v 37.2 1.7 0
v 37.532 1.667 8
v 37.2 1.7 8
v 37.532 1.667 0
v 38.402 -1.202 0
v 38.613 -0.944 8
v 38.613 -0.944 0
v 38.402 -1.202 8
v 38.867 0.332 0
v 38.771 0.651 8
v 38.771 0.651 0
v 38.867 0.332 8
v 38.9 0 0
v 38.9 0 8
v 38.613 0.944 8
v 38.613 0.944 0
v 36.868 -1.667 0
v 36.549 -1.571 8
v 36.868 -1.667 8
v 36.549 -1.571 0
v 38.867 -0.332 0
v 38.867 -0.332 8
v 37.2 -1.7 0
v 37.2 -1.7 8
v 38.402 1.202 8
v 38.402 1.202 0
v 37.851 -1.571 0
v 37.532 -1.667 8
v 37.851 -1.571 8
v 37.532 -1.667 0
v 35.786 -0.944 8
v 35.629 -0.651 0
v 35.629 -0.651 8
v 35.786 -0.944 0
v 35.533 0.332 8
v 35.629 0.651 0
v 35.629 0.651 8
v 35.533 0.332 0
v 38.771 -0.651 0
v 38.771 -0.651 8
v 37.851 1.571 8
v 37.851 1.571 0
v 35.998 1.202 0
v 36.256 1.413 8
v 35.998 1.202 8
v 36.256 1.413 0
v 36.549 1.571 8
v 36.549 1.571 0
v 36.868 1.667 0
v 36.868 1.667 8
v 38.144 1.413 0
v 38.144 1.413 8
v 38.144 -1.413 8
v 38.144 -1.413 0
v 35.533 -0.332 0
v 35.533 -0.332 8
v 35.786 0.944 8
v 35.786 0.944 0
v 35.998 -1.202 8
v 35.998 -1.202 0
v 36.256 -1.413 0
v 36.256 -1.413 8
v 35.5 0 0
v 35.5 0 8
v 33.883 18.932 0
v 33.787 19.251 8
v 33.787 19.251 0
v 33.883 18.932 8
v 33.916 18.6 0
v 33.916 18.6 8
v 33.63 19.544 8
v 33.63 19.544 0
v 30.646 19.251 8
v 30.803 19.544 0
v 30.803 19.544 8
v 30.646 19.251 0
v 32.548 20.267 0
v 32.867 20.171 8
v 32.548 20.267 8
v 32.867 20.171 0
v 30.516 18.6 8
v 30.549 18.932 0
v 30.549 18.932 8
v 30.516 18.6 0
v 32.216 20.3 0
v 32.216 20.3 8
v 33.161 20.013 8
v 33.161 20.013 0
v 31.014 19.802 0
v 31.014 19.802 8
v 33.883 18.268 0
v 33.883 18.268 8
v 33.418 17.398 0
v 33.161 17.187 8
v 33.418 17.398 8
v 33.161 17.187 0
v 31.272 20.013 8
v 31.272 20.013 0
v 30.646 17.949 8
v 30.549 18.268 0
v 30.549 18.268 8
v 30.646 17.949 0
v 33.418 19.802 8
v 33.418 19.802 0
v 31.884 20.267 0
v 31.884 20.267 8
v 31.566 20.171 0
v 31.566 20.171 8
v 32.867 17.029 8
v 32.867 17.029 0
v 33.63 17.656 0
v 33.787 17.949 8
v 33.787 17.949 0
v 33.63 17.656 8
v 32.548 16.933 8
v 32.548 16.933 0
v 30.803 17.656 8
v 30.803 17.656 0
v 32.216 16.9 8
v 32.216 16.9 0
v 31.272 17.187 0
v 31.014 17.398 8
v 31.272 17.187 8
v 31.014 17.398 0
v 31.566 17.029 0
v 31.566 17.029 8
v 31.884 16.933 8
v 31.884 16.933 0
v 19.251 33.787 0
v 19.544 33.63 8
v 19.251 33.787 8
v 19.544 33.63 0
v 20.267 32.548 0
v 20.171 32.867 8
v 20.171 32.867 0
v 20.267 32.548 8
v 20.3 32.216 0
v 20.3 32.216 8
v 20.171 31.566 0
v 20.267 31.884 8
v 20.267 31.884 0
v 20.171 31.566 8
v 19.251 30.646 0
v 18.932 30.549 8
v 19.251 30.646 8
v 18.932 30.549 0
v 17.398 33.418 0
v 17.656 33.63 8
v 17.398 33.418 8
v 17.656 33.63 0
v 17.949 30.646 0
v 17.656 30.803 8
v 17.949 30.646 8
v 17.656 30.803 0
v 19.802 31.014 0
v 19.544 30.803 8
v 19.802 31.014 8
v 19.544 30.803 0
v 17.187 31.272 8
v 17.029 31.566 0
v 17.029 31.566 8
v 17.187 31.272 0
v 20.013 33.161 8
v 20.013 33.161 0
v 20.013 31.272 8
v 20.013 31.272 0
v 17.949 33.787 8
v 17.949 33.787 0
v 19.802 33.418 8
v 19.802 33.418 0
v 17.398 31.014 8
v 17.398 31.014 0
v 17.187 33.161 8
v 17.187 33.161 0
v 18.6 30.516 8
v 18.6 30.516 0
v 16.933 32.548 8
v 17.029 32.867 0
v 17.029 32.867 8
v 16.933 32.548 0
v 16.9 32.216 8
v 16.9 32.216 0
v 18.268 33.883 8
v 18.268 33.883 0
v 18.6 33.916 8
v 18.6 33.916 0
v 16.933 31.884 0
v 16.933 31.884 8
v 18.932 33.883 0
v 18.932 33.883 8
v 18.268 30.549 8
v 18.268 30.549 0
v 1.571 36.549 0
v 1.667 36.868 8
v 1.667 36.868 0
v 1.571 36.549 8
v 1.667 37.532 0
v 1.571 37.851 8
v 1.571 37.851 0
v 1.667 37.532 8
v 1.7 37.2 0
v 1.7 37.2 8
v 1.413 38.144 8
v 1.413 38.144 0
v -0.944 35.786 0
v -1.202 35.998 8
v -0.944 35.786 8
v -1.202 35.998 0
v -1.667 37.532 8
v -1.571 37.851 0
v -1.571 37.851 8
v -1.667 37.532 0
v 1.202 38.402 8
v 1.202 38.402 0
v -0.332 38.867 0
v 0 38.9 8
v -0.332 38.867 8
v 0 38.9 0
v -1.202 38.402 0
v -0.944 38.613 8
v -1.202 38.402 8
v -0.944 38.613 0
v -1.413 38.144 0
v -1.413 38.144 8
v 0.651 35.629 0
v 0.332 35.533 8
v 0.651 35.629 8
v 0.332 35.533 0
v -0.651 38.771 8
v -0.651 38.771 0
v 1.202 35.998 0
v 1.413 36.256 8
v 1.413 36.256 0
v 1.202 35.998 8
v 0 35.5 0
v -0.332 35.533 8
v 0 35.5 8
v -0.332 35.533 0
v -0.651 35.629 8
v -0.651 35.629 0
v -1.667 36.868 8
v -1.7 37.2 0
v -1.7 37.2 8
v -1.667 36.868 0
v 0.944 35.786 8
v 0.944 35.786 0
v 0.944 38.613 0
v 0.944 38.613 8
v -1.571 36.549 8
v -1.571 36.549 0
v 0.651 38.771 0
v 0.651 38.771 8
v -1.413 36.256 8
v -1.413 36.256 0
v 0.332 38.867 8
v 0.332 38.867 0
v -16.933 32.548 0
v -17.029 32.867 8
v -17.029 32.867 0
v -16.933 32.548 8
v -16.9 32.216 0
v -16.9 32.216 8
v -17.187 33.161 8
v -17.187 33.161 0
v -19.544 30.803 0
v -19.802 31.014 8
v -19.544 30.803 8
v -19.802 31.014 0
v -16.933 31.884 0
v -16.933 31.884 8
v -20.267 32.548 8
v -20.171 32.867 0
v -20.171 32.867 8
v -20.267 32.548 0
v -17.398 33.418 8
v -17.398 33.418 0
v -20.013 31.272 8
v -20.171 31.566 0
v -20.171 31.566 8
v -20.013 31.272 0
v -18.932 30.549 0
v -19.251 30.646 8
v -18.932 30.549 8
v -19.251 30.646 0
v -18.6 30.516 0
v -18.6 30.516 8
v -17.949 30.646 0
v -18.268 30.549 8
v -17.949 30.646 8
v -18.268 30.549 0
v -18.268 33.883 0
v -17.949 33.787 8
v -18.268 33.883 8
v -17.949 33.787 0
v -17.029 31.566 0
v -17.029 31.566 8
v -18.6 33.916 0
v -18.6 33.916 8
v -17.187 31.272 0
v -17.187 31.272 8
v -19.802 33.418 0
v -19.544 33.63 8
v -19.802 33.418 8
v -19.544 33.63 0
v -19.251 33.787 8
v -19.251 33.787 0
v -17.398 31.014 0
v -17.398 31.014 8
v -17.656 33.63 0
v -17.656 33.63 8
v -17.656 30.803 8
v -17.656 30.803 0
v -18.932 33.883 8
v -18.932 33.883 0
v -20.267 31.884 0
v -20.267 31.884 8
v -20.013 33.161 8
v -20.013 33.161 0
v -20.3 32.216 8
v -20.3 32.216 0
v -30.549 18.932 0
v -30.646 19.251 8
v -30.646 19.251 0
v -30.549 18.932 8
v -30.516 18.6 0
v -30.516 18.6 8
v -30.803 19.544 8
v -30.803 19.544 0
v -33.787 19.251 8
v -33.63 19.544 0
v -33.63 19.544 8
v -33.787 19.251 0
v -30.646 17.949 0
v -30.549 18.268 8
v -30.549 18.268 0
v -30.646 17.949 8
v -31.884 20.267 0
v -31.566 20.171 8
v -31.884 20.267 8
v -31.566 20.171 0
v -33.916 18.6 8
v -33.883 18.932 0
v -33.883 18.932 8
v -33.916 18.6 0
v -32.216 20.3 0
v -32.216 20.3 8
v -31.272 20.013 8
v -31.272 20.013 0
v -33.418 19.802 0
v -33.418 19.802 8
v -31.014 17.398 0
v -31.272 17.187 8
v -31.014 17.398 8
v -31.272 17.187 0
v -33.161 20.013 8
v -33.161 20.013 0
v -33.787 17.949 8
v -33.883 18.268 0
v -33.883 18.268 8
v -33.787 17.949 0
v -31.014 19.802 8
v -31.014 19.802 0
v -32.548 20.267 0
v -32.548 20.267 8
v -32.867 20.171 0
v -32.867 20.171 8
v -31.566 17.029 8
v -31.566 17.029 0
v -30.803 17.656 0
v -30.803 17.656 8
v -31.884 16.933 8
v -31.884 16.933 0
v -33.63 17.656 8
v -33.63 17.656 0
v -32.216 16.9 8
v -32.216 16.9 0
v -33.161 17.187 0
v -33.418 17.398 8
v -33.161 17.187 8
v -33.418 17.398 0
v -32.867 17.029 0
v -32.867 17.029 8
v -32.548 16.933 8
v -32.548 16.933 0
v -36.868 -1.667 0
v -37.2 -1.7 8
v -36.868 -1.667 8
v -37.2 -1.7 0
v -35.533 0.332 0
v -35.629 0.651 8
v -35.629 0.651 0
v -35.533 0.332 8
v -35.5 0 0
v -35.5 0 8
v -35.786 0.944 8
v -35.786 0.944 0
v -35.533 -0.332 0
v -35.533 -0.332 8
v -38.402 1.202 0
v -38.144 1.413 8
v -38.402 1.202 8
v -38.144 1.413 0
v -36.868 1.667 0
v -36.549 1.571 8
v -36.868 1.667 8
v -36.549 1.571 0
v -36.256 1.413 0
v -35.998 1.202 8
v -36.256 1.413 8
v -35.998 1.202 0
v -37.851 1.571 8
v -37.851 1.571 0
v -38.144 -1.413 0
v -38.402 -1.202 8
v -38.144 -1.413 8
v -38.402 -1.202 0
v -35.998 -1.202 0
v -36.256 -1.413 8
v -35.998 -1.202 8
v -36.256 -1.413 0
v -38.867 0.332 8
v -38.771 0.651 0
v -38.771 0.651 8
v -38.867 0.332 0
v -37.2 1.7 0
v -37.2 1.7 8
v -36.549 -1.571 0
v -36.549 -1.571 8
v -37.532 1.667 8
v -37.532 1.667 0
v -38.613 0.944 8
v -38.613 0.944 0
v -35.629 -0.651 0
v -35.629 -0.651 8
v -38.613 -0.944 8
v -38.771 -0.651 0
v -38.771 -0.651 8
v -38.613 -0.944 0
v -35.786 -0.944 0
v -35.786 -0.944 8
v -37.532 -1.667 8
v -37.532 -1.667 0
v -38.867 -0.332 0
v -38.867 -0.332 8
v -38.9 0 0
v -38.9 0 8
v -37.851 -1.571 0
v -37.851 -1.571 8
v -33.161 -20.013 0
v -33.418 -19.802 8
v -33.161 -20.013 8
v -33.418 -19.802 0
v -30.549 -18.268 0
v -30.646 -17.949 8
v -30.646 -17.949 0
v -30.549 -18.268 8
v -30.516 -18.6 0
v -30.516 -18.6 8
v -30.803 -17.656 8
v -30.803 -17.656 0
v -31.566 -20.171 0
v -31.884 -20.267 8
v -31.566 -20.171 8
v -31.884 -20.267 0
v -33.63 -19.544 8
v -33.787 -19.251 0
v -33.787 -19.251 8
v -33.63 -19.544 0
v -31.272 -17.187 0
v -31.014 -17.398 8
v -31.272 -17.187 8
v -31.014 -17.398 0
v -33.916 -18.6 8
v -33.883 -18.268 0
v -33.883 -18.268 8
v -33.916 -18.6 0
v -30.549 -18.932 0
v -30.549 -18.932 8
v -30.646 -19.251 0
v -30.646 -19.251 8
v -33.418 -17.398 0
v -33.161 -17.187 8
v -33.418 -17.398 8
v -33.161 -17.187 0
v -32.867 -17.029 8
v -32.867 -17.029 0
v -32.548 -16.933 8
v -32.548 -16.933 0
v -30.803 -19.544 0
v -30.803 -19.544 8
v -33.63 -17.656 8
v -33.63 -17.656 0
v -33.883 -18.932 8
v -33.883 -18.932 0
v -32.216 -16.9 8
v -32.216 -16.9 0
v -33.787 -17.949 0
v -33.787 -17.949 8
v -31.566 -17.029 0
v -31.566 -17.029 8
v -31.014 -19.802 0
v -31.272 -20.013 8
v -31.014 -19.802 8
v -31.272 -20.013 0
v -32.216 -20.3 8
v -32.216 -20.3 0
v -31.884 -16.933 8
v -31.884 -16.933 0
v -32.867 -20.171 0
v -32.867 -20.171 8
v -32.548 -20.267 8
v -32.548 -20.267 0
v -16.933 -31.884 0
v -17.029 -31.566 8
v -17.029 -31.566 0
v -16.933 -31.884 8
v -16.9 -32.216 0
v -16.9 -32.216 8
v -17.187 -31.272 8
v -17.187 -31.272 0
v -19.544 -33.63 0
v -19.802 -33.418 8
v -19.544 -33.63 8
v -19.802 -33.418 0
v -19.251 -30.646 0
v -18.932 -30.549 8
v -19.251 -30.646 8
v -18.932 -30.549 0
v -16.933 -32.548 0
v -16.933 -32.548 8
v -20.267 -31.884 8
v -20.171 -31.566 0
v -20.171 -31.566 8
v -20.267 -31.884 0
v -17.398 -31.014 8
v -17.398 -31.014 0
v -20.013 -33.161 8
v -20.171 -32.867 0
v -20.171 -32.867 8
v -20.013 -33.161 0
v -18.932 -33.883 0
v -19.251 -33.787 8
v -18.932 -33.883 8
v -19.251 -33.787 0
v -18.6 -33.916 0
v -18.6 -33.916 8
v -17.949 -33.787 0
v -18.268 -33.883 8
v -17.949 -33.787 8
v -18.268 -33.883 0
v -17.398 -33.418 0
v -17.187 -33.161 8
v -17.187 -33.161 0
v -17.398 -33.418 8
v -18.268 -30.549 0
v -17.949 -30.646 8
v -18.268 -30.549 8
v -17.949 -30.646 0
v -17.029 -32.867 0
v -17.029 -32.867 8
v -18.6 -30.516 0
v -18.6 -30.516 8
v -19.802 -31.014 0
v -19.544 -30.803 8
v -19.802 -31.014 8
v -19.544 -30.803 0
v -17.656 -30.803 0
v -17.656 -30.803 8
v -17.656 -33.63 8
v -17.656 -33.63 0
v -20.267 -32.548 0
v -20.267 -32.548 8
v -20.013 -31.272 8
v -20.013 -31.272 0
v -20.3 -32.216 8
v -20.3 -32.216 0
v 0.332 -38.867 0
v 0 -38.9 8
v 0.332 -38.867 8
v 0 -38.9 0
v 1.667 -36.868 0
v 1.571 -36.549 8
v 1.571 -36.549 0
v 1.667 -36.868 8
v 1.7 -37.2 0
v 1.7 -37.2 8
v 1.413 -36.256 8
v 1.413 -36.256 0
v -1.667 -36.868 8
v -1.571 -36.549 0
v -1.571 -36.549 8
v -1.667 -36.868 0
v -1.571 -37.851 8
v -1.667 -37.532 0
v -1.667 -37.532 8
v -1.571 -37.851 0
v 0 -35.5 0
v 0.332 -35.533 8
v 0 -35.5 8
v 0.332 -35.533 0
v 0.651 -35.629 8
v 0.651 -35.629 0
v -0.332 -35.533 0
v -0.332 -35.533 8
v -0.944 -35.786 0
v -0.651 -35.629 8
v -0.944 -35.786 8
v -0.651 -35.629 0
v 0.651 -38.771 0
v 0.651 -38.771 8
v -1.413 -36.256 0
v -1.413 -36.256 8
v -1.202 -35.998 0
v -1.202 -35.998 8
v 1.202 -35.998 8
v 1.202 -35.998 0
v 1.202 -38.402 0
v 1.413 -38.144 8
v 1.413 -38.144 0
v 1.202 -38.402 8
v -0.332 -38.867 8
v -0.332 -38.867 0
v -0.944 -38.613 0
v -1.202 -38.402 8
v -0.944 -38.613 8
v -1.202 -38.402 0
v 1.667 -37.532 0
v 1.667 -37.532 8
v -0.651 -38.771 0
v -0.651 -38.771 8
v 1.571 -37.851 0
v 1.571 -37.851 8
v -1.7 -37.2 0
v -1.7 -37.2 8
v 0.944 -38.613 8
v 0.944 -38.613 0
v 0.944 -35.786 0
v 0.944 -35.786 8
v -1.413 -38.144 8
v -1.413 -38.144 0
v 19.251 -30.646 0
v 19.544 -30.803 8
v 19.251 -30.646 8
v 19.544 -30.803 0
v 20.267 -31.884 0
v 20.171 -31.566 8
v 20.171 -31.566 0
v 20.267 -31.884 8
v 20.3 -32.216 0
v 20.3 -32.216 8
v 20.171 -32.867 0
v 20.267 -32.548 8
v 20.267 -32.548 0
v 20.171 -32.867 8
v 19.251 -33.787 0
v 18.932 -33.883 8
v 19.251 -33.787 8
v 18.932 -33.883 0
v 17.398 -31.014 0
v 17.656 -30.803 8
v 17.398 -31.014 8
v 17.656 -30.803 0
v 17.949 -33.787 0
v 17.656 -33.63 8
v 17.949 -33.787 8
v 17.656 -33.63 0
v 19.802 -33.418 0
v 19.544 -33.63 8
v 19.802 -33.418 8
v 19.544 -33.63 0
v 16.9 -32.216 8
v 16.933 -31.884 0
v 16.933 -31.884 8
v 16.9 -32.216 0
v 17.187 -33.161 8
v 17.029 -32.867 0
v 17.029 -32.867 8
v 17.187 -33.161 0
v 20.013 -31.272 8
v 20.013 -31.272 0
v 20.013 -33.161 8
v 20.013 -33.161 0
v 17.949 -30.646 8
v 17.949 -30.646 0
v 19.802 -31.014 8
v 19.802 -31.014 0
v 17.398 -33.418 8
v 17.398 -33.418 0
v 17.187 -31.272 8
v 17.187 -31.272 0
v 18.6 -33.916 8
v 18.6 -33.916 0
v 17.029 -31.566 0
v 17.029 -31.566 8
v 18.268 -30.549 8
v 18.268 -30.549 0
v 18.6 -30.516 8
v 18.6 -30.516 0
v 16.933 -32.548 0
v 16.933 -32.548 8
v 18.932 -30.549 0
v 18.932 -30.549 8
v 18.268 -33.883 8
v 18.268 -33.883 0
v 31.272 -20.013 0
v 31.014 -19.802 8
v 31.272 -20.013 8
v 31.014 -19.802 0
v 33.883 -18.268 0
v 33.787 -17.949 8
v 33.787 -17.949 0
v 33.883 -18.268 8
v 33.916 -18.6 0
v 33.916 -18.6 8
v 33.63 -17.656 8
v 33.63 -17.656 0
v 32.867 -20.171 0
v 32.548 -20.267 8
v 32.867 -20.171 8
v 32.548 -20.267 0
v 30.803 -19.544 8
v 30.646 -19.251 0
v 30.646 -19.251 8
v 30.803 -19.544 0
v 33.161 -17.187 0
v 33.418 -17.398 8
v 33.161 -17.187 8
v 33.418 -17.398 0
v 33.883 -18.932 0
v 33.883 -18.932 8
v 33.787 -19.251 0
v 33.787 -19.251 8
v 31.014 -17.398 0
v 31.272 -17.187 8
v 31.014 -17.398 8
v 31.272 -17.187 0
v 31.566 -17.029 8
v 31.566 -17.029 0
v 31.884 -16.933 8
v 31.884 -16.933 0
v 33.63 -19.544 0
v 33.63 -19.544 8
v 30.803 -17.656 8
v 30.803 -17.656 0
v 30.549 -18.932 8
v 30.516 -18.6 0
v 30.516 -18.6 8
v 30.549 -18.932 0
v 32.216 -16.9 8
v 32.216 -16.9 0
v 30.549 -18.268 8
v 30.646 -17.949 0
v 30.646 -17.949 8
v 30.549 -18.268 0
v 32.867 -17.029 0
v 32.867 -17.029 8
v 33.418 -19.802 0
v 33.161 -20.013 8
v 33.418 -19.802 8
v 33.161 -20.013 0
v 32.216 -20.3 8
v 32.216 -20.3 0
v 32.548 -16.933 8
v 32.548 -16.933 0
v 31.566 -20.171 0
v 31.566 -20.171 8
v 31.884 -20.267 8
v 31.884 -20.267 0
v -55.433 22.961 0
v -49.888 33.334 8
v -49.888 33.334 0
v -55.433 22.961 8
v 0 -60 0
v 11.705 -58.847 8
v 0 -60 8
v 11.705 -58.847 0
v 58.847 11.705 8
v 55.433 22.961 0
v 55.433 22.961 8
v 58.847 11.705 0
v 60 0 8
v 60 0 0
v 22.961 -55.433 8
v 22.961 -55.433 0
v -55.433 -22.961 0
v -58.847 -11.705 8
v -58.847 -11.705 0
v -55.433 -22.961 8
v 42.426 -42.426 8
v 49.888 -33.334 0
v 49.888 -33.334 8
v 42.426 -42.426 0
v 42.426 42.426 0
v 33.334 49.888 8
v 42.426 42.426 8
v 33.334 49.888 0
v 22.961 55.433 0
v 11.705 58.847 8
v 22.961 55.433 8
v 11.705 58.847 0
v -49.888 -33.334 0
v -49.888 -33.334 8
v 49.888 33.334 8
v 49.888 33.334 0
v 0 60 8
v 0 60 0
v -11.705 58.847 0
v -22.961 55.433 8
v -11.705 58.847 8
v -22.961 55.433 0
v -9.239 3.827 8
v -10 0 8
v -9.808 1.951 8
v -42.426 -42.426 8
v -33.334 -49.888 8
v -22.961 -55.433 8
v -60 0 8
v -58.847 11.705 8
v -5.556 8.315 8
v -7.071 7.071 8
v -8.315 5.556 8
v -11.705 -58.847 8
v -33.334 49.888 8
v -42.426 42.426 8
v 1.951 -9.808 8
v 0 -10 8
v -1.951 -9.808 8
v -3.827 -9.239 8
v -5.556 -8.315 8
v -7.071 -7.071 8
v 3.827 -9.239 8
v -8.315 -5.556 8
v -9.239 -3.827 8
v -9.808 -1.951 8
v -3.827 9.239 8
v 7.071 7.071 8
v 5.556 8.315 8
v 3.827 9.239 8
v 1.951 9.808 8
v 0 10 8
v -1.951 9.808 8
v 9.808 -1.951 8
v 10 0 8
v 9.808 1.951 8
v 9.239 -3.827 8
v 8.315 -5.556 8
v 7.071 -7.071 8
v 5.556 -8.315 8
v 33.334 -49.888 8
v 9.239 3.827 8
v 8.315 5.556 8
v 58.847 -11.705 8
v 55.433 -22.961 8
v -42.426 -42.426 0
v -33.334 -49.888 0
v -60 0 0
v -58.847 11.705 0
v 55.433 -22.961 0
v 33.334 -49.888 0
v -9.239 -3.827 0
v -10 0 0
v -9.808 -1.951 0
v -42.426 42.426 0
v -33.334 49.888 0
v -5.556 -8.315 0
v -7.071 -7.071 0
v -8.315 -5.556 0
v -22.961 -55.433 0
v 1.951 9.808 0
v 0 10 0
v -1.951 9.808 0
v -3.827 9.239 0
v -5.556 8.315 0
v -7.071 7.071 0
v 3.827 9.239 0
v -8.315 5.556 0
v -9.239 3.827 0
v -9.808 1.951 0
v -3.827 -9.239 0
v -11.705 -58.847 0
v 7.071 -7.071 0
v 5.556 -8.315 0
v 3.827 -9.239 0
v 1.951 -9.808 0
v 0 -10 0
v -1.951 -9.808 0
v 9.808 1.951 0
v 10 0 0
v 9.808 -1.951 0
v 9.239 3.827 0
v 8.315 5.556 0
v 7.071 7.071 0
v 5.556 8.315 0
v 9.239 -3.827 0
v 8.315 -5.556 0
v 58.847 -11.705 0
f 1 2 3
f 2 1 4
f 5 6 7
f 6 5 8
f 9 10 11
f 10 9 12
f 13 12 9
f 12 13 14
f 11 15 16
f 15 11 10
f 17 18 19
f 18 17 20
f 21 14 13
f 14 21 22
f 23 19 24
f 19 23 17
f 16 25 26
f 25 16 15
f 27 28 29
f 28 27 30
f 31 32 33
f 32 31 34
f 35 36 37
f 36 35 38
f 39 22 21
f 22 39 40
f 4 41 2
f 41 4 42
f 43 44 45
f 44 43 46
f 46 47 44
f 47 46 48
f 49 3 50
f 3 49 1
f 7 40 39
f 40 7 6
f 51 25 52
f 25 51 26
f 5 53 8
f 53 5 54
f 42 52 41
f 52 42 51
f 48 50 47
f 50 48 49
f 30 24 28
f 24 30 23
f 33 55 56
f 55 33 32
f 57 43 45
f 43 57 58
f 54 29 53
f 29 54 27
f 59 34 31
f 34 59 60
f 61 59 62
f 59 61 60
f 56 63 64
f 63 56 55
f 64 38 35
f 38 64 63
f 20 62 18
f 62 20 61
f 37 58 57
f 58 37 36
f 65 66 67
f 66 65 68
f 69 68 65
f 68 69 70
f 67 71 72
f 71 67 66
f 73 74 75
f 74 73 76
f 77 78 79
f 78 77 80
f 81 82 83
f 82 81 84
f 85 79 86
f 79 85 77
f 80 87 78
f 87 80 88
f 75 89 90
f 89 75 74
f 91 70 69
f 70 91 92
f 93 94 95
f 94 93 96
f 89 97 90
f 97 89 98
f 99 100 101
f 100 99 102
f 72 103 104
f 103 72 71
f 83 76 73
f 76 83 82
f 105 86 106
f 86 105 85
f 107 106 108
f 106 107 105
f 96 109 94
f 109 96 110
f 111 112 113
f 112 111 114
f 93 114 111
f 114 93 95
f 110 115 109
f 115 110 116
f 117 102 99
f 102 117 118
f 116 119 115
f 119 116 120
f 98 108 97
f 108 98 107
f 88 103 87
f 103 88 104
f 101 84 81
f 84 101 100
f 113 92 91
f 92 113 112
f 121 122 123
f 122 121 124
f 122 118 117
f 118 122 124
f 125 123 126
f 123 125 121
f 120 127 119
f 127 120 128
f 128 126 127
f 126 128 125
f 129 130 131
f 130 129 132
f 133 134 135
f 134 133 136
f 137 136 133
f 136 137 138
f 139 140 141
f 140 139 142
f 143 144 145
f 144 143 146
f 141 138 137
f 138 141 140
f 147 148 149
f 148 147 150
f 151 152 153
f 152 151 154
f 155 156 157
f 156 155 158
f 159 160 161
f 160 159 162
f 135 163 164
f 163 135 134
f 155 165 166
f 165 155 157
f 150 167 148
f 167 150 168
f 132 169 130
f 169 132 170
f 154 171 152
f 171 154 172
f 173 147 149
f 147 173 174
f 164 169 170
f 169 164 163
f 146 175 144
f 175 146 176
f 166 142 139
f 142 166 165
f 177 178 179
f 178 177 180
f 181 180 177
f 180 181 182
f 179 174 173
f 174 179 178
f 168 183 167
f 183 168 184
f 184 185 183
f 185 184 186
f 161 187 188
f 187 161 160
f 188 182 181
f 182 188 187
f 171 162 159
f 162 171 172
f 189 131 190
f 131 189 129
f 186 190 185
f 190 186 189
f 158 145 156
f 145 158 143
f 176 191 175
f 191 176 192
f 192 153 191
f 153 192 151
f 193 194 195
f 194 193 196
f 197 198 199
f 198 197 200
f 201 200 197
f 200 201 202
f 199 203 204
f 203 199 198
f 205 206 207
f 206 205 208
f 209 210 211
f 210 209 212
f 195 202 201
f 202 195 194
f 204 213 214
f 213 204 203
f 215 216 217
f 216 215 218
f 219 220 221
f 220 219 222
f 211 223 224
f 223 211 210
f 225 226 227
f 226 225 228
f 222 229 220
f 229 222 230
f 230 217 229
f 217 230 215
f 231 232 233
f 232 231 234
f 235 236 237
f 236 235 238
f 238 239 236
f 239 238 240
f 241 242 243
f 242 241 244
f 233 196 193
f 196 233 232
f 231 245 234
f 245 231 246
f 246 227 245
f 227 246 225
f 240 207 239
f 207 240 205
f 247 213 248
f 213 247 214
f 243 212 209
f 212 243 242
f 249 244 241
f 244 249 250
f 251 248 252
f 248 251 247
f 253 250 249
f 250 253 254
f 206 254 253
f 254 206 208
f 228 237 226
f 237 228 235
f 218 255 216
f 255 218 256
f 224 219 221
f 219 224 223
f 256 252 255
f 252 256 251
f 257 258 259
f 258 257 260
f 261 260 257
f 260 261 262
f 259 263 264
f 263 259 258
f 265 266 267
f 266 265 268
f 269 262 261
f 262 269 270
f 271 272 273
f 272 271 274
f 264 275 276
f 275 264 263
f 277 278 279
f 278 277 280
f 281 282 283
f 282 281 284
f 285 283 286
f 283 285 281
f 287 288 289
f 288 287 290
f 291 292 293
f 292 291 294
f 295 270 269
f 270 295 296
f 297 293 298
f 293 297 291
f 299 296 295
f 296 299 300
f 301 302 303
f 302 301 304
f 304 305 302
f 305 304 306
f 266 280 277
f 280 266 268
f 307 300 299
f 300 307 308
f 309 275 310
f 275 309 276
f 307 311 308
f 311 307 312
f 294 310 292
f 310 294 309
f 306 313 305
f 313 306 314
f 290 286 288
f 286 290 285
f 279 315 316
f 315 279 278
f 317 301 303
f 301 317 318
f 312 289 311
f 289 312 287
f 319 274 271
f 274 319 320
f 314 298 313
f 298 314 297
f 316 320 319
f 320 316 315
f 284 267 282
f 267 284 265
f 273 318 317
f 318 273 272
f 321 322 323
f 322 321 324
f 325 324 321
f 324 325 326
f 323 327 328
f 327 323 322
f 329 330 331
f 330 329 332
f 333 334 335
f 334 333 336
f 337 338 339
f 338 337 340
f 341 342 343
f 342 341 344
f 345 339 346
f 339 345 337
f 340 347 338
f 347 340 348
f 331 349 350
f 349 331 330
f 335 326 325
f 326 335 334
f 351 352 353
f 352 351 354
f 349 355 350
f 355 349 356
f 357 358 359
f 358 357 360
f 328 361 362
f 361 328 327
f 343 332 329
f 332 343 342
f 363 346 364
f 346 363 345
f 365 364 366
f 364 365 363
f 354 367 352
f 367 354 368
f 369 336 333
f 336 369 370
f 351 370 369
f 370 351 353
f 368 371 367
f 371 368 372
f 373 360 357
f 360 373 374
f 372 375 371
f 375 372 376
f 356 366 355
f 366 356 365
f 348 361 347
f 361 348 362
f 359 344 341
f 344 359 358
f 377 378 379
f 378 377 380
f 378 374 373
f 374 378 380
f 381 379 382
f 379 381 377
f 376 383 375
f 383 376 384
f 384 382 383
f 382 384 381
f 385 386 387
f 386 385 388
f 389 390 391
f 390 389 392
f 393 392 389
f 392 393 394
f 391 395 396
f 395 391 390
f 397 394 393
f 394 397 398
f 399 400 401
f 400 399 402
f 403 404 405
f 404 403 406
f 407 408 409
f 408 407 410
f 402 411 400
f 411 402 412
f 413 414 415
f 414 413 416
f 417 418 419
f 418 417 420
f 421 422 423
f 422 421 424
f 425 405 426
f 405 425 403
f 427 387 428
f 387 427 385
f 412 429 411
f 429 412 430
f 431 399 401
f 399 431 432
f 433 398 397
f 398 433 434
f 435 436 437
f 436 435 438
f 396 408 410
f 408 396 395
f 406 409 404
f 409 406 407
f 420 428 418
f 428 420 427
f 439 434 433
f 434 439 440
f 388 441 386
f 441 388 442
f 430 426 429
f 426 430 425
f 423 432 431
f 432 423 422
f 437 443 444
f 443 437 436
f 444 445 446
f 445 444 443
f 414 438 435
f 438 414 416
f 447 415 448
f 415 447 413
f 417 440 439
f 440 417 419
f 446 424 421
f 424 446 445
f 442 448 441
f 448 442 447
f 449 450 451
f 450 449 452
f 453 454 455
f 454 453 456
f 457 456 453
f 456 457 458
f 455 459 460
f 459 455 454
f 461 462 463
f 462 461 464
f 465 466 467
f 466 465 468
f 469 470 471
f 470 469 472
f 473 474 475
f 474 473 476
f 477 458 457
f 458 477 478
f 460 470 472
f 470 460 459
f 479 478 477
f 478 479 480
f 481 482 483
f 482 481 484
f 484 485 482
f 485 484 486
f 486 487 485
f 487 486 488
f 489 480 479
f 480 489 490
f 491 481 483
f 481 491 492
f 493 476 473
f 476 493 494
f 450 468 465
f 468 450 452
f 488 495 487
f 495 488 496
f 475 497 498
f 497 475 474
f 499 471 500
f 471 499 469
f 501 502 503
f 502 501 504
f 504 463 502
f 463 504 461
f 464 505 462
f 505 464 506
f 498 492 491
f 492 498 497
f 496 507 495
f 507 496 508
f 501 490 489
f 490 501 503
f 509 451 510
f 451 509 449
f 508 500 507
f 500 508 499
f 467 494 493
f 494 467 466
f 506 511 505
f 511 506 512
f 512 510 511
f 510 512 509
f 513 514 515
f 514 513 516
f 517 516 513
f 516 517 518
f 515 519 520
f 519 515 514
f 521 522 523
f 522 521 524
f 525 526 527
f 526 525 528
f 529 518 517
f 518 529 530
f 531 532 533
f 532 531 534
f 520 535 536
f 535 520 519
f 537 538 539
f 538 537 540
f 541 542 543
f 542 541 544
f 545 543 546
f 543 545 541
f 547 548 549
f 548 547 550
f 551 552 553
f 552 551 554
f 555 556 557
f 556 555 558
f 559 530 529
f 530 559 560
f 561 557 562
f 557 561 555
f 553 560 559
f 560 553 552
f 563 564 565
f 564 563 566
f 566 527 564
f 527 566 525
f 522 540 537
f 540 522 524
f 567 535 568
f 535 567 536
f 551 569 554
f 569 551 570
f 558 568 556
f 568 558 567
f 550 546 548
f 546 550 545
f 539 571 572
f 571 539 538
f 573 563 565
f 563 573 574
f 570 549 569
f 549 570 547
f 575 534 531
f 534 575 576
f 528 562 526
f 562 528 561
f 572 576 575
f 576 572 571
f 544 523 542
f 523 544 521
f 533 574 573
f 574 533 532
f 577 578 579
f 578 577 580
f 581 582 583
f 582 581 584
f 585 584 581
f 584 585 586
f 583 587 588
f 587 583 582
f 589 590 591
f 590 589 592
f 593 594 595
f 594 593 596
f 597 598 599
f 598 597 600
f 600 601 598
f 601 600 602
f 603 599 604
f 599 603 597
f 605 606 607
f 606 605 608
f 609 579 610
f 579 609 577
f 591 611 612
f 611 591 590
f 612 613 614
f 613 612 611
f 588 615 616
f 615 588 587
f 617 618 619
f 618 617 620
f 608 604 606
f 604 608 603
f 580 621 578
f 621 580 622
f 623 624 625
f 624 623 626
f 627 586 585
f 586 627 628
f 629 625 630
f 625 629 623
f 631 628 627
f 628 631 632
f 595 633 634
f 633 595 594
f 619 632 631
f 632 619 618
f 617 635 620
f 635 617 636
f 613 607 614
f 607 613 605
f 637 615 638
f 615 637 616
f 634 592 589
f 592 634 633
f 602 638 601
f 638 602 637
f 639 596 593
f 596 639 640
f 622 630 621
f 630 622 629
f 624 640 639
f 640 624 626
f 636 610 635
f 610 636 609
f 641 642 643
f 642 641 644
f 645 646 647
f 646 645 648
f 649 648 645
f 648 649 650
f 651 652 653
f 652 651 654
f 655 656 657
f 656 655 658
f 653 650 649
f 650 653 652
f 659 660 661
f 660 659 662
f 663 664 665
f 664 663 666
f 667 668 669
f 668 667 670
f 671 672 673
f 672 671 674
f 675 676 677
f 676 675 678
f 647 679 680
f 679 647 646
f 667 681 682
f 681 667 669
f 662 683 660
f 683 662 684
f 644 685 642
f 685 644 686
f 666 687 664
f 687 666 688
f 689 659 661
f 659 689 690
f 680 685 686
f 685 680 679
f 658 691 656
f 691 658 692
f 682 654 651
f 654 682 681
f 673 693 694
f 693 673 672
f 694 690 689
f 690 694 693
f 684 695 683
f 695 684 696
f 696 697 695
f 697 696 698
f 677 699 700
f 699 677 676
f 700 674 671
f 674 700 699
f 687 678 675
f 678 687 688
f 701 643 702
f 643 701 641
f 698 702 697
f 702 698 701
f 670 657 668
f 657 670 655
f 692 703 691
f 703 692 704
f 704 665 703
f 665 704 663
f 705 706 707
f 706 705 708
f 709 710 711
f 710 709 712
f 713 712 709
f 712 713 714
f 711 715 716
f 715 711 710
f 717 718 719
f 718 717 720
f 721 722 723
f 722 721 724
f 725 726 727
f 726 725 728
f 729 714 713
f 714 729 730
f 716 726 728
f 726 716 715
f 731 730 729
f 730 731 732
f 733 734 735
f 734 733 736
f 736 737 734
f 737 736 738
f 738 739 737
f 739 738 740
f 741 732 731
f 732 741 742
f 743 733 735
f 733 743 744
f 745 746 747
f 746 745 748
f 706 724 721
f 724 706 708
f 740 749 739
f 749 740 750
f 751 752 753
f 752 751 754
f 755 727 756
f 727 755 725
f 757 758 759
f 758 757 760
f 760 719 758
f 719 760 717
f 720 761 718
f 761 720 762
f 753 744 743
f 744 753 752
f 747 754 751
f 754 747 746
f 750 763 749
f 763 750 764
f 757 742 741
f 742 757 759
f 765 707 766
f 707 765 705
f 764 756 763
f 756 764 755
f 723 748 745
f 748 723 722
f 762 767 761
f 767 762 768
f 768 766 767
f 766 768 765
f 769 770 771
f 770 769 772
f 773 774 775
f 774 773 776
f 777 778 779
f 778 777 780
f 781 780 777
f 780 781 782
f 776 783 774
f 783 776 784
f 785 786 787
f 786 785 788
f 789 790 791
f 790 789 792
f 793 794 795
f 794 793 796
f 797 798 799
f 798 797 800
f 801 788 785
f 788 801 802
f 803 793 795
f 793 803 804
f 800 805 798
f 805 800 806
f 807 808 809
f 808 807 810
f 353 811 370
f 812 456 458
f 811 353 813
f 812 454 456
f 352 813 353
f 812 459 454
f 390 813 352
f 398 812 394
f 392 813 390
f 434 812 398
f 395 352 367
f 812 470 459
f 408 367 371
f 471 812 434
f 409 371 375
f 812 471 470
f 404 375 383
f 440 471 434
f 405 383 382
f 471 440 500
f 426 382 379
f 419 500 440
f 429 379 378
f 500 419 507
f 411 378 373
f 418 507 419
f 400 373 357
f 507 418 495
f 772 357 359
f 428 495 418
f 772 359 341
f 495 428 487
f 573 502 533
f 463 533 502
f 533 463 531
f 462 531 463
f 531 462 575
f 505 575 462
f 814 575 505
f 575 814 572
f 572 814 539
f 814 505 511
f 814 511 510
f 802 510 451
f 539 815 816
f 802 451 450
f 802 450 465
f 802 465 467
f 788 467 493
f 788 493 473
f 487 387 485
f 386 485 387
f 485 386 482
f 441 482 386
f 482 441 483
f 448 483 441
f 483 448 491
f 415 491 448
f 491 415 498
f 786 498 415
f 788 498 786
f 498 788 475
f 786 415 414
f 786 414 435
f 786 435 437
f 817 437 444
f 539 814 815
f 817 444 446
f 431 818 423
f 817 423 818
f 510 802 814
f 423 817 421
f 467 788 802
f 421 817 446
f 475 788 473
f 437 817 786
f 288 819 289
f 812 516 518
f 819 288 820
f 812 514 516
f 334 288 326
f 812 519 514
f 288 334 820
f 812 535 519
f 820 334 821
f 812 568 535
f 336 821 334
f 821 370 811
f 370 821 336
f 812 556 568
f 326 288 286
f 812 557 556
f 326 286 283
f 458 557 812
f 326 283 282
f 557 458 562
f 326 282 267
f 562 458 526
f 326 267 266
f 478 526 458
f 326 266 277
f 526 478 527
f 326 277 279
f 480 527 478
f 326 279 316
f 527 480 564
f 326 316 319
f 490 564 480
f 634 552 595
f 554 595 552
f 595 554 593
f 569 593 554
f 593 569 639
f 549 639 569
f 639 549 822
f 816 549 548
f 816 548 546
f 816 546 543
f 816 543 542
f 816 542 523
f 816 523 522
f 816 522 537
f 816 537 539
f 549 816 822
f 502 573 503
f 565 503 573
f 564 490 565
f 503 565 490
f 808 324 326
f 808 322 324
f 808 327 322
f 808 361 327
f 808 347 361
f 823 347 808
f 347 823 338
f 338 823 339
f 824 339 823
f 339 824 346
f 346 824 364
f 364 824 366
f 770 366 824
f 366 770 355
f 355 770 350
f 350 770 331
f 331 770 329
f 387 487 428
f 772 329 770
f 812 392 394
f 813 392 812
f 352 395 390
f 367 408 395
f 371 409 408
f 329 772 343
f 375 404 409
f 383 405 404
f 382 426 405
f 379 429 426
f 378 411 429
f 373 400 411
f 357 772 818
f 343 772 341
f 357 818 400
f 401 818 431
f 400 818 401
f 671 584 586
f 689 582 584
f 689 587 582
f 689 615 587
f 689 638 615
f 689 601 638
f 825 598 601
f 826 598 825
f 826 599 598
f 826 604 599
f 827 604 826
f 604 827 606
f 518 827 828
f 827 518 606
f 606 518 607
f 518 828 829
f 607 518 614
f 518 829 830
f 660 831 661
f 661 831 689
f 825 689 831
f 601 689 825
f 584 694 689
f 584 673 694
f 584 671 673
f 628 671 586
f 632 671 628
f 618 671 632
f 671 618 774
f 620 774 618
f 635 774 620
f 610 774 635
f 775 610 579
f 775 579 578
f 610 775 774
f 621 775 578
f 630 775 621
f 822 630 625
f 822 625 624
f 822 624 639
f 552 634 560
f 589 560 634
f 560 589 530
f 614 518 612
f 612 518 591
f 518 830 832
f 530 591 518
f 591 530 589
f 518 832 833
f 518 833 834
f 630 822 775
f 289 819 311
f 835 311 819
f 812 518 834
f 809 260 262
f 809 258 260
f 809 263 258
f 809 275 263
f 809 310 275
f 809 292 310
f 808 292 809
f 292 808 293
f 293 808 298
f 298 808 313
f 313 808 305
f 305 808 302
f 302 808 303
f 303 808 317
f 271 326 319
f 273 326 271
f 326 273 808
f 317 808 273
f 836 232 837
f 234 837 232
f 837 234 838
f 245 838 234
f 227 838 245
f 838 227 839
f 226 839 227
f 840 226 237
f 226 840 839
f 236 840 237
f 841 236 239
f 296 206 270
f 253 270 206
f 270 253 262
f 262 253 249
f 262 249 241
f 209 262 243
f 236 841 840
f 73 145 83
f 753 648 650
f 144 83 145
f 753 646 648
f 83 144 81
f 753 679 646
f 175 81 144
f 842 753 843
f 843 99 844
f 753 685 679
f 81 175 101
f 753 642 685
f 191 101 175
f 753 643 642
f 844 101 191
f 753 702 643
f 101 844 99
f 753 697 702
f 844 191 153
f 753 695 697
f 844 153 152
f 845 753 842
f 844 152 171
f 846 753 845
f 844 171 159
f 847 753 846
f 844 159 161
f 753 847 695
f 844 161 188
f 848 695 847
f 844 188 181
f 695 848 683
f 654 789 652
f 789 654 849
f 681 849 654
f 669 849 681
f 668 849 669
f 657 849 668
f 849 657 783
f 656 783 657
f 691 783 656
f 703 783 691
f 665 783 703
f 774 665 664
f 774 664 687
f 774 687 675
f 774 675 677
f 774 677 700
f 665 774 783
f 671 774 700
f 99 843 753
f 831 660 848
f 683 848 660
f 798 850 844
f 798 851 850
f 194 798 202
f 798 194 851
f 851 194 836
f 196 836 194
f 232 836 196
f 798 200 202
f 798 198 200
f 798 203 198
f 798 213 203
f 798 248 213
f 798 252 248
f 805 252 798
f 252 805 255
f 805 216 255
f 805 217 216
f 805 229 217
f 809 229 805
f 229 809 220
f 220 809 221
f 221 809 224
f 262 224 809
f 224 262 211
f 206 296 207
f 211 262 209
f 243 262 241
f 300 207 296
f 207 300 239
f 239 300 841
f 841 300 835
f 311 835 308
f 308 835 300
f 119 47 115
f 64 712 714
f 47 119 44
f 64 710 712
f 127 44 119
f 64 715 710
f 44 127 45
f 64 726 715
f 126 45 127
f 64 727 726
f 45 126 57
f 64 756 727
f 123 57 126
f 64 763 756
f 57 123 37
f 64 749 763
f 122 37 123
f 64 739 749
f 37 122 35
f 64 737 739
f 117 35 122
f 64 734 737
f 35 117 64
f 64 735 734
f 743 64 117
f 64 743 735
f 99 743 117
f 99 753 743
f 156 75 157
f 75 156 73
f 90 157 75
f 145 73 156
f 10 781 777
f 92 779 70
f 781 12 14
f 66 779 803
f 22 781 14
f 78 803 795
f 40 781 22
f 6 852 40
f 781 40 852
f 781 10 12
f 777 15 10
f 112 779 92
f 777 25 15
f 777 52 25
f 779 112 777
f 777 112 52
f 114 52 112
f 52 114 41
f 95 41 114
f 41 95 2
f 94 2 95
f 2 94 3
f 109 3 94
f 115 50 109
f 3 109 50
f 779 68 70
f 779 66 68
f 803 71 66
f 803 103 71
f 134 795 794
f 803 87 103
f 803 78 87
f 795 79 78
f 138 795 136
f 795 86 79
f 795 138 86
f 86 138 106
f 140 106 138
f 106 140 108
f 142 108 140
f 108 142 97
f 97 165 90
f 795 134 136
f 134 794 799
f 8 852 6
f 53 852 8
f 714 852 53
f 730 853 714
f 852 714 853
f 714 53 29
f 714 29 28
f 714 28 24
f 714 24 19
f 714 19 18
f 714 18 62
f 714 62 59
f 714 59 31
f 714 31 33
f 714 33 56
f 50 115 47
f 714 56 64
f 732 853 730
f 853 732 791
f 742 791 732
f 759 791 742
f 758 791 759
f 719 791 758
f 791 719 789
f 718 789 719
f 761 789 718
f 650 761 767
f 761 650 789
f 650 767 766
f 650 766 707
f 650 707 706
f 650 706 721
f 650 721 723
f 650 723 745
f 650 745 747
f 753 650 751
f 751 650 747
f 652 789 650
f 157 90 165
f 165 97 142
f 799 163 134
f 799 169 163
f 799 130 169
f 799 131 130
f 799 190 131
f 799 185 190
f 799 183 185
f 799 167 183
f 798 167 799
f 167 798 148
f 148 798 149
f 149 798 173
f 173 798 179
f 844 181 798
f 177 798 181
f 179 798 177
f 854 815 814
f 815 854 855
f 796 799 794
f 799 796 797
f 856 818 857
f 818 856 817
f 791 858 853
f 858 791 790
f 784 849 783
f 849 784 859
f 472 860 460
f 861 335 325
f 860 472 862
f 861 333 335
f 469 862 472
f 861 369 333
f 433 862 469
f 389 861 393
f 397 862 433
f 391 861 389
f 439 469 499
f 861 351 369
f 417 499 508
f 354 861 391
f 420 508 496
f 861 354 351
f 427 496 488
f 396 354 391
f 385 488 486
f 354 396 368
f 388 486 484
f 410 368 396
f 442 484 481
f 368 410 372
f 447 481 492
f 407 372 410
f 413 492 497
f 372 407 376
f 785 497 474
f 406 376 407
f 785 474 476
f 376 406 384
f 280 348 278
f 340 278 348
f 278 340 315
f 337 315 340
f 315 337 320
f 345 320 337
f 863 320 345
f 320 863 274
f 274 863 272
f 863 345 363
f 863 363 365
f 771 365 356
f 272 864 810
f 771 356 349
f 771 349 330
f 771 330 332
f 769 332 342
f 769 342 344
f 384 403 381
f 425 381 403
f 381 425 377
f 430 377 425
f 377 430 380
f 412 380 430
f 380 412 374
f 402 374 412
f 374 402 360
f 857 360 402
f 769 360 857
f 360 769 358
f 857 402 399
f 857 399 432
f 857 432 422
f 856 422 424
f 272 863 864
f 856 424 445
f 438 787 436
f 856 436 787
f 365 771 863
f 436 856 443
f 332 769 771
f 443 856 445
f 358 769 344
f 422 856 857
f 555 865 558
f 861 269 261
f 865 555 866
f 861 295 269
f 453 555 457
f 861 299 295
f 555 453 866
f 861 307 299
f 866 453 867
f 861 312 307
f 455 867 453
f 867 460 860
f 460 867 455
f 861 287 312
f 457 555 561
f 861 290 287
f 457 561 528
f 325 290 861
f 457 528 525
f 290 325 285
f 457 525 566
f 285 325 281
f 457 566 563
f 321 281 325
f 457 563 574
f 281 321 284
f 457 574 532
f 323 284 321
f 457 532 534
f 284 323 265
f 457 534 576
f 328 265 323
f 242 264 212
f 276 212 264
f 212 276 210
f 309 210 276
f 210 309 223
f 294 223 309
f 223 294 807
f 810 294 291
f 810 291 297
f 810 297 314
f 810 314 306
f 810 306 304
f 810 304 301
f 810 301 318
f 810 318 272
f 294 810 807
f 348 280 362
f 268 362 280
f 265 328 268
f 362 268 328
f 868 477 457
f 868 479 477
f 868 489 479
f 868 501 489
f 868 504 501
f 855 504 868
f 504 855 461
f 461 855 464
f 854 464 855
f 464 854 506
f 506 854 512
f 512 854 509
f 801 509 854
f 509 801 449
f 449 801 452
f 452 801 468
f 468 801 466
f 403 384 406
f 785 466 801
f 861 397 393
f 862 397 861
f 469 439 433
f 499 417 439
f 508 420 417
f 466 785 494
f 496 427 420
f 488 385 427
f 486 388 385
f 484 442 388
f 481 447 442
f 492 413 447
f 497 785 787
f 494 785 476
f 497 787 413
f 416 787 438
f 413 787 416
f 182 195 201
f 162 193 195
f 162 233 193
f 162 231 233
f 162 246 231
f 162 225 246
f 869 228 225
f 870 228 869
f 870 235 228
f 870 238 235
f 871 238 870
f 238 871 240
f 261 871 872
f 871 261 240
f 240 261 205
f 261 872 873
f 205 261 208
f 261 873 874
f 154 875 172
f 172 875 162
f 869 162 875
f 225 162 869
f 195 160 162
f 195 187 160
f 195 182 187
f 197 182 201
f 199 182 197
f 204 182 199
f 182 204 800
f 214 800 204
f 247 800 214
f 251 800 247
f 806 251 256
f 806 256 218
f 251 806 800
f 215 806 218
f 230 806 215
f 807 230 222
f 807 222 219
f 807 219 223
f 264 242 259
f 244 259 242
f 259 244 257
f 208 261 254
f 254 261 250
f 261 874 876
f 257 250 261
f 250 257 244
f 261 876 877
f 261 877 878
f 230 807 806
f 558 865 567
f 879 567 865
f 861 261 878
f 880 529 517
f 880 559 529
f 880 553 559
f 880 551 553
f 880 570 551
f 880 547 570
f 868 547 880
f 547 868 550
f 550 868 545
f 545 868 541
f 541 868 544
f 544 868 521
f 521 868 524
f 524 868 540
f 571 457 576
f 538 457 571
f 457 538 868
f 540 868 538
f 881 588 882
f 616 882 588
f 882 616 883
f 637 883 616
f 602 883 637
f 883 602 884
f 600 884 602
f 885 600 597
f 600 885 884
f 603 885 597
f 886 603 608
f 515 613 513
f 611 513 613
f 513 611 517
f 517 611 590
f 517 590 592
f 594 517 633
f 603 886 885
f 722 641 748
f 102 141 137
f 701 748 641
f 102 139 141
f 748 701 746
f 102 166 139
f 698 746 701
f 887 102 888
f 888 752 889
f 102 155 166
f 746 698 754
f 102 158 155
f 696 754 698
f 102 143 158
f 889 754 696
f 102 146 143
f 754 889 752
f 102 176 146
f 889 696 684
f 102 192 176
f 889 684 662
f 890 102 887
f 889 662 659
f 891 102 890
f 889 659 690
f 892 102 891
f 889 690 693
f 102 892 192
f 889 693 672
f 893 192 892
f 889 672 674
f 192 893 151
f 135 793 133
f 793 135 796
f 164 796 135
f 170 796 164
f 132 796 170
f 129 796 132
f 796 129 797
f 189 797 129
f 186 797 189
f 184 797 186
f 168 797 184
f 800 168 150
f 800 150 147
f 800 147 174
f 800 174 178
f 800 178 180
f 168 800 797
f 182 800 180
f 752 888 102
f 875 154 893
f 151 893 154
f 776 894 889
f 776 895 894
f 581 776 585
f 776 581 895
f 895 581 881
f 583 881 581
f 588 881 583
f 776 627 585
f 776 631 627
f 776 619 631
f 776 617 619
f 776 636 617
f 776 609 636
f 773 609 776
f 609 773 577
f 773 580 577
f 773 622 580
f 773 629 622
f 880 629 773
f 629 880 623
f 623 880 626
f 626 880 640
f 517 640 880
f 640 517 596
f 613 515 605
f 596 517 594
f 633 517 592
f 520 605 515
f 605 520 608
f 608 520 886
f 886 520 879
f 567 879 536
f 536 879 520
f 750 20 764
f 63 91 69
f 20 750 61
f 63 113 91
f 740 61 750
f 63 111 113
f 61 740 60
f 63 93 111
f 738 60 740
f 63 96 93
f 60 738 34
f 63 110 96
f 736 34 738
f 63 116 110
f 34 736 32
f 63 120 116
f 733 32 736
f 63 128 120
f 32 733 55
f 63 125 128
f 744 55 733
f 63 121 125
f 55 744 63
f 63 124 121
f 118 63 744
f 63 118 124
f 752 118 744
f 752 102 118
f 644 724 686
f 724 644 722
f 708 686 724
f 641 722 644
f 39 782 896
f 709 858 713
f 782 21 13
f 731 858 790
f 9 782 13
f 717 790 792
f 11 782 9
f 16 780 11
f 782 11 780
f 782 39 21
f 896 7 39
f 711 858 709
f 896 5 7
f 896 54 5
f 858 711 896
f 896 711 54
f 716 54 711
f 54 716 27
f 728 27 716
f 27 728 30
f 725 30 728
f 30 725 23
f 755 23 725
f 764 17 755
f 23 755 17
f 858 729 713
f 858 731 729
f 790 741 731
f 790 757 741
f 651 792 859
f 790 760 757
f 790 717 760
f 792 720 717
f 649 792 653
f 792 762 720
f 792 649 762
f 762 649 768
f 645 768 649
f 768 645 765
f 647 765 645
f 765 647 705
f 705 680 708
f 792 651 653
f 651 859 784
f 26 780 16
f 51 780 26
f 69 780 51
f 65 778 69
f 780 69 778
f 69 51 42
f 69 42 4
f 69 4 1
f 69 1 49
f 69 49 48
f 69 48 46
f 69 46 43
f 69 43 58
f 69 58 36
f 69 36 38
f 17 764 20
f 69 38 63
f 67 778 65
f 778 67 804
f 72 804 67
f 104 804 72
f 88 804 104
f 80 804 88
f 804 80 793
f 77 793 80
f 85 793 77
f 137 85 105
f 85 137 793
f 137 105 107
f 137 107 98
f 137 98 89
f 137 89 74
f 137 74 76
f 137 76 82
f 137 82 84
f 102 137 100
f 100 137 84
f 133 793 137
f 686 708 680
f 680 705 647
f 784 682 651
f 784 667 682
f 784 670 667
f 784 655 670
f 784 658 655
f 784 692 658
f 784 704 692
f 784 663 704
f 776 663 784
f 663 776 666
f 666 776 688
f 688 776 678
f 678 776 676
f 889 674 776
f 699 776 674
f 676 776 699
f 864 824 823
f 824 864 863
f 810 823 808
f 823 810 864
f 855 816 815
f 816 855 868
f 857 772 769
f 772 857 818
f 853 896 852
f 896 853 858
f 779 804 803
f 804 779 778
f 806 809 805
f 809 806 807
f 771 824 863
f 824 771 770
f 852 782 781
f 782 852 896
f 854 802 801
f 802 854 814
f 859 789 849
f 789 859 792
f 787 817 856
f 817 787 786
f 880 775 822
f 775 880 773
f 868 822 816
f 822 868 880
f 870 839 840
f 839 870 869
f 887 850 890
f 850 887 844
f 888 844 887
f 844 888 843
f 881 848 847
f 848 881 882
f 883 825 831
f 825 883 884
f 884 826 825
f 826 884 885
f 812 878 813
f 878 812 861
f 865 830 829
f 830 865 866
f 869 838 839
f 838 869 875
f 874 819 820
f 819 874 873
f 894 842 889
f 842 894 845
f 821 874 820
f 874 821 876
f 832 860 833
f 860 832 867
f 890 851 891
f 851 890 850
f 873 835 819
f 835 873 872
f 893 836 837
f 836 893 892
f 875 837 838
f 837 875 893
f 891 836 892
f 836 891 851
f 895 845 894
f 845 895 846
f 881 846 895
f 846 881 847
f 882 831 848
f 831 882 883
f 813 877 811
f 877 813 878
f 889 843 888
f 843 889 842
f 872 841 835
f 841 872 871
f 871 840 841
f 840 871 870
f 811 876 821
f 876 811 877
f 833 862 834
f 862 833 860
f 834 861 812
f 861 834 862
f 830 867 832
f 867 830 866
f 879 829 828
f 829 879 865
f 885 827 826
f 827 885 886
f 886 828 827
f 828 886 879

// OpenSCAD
$fn = 32;

// ----------------------------------------------------------------------
// Flange Ø120 x 8
// 12 holes on a Ø74.4 bolt circle, bolted joints
// ----------------------------------------------------------------------

// --- parameters (mm) ---
flange_d = 120;  // outside diameter of the flange
thickness = 8;   // flange thickness
holes = 12;      // number of bolt holes
pcd = 74.4;      // bolt circle diameter
start_deg = 0;   // angle of the first hole, from +X
hole_d = 3.4;    // bolt hole diameter
bore_d = 20;     // central through bore
hub_d = 32;      // hub outside diameter
hub_h = 0;       // hub height above the flange face (0 = no hub)

// --- derived feature positions (mm) ---
height = thickness + hub_h;  // = 8   overall height of the part
pcd_r = pcd / 2;             // = 37.2   bolt circle radius
hole_step = 360 / holes;     // = 30   angular pitch
feature_centers = [
  [pcd_r * cos(start_deg + 0 * hole_step), pcd_r * sin(start_deg + 0 * hole_step)],
  [pcd_r * cos(start_deg + 1 * hole_step), pcd_r * sin(start_deg + 1 * hole_step)],
  [pcd_r * cos(start_deg + 2 * hole_step), pcd_r * sin(start_deg + 2 * hole_step)],
  [pcd_r * cos(start_deg + 3 * hole_step), pcd_r * sin(start_deg + 3 * hole_step)],
  [pcd_r * cos(start_deg + 4 * hole_step), pcd_r * sin(start_deg + 4 * hole_step)],
  [pcd_r * cos(start_deg + 5 * hole_step), pcd_r * sin(start_deg + 5 * hole_step)],
  [pcd_r * cos(start_deg + 6 * hole_step), pcd_r * sin(start_deg + 6 * hole_step)],
  [pcd_r * cos(start_deg + 7 * hole_step), pcd_r * sin(start_deg + 7 * hole_step)],
  [pcd_r * cos(start_deg + 8 * hole_step), pcd_r * sin(start_deg + 8 * hole_step)],
  [pcd_r * cos(start_deg + 9 * hole_step), pcd_r * sin(start_deg + 9 * hole_step)],
  [pcd_r * cos(start_deg + 10 * hole_step), pcd_r * sin(start_deg + 10 * hole_step)],
  [pcd_r * cos(start_deg + 11 * hole_step), pcd_r * sin(start_deg + 11 * hole_step)]
];   // bolt hole centres on the pitch circle

// flange disc, every hole and the bore cut straight through
difference() {
  union() {
    cylinder(d = flange_d, h = thickness);
  }
  translate([0, 0, -1]) cylinder(d = bore_d, h = height + 2);  // bore, through
  for (centre = feature_centers)
    translate([centre[0], centre[1], -1]) cylinder(d = hole_d, h = thickness + 2);
}
